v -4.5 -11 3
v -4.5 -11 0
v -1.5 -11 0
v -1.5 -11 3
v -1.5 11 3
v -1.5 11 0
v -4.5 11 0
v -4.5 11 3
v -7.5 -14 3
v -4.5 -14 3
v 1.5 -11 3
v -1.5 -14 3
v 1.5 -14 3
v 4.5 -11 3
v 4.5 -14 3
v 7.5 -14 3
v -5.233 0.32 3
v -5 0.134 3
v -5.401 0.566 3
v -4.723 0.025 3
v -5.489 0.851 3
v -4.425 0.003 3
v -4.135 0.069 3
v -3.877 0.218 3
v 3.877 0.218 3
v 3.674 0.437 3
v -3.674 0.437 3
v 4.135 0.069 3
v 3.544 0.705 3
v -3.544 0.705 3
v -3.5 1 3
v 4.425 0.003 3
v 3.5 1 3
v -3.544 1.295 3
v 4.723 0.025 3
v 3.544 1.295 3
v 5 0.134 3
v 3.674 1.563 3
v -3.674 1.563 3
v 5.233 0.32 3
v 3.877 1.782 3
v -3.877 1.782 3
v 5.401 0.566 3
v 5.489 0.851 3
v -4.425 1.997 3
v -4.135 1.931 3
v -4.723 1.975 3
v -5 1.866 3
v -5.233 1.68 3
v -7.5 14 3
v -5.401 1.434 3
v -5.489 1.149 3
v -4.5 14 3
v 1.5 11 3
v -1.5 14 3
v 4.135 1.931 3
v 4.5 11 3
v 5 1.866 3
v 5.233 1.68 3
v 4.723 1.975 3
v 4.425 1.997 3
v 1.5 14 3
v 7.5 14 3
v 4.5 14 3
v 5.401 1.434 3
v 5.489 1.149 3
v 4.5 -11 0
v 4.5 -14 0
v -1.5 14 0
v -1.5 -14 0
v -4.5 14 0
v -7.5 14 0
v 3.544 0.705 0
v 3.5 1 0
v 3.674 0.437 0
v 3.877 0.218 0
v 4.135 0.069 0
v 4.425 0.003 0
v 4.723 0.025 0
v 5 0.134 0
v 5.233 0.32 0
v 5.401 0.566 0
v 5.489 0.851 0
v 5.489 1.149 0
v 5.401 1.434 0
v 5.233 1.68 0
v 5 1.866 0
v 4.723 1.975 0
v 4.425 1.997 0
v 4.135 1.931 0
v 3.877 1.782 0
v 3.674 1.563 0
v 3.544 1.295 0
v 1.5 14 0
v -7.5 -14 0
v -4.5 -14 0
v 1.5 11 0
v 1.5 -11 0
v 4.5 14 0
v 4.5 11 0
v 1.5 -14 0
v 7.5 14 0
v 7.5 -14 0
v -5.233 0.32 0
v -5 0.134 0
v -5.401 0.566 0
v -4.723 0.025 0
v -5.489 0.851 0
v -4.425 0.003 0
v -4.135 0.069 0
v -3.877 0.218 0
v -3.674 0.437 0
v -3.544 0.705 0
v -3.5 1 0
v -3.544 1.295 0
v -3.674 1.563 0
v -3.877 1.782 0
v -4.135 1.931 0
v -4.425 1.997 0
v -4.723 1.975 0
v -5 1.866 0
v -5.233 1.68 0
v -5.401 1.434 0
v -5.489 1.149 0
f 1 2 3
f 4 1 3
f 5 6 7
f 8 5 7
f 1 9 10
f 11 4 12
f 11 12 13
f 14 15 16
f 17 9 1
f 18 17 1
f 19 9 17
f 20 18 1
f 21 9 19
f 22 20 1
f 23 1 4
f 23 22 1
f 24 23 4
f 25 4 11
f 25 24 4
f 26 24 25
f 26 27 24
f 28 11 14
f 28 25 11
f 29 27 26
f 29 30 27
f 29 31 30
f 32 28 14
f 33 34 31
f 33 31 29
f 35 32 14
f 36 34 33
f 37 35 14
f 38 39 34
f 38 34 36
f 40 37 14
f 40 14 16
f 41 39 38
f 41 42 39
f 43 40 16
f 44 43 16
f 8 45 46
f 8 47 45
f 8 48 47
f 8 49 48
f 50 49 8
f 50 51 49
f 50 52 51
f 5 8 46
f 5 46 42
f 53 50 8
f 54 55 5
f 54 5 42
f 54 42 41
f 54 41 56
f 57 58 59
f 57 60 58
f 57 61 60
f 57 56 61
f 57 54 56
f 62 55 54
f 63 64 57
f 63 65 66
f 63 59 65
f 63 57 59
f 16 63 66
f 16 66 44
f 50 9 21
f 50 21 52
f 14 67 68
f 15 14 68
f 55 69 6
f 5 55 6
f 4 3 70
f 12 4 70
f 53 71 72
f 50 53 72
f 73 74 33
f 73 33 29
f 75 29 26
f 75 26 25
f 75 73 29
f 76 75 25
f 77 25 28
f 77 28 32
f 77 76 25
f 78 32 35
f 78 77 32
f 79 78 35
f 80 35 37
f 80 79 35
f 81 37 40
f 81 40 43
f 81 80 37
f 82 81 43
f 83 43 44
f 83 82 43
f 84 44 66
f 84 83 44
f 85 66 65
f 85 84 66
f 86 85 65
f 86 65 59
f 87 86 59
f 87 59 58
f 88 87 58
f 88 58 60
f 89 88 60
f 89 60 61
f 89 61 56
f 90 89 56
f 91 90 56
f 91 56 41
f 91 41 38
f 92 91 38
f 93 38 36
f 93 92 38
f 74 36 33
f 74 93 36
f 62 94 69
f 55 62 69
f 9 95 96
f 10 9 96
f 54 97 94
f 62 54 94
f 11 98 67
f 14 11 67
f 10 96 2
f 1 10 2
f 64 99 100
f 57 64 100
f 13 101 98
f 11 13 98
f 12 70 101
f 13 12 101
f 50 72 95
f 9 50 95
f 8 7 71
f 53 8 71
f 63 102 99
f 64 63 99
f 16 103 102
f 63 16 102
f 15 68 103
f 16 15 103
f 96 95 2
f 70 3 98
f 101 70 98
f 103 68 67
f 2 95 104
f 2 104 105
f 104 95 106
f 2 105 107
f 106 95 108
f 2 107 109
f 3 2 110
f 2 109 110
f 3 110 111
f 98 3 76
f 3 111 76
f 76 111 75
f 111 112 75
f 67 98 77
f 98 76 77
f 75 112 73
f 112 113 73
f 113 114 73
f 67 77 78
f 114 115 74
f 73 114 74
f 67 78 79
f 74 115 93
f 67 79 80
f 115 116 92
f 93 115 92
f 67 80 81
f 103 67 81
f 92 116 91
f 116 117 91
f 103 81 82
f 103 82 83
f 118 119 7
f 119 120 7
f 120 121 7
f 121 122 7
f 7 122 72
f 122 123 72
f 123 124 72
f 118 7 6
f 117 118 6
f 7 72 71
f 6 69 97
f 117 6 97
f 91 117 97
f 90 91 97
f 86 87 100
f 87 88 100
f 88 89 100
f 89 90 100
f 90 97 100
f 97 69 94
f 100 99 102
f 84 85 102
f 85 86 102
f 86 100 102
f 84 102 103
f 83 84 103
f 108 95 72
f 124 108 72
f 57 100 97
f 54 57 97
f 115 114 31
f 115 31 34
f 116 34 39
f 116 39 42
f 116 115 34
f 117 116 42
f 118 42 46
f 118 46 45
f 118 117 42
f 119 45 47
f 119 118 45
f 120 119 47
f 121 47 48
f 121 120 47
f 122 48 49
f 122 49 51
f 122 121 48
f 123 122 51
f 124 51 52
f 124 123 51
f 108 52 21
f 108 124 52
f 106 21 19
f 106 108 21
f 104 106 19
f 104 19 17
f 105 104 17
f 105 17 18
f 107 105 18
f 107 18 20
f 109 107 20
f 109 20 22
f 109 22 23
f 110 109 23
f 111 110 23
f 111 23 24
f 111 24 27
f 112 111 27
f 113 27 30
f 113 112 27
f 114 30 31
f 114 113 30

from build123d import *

# Parameters (mm, degrees)
SKETCH1_R           = 1
BOSS_EXTRUDE2_DEPTH = 3


with BuildPart() as part:
    # Sketch1 → Boss-Extrude2 (new body)
    with BuildSketch(Plane.XY):
        Polygon((-7.5, -14), (-4.5, -14), (-4.5, -11), (-1.5, -11), (-1.5, -14), (1.5, -14), (1.5, -11), (4.5, -11), (4.5, -14), (7.5, -14), (7.5, 14), (4.5, 14), (4.5, 11), (1.5, 11), (1.5, 14), (-1.5, 14), (-1.5, 11), (-4.5, 11), (-4.5, 14), (-7.5, 14), align=None)
        with Locations((-4.5, 1)):
            Circle(SKETCH1_R, mode=Mode.SUBTRACT)
        with Locations(Location((4.5, 1, 0), (0, 0, 180))):
            Circle(SKETCH1_R, mode=Mode.SUBTRACT)
    extrude(amount=BOSS_EXTRUDE2_DEPTH)


solid = part.part
